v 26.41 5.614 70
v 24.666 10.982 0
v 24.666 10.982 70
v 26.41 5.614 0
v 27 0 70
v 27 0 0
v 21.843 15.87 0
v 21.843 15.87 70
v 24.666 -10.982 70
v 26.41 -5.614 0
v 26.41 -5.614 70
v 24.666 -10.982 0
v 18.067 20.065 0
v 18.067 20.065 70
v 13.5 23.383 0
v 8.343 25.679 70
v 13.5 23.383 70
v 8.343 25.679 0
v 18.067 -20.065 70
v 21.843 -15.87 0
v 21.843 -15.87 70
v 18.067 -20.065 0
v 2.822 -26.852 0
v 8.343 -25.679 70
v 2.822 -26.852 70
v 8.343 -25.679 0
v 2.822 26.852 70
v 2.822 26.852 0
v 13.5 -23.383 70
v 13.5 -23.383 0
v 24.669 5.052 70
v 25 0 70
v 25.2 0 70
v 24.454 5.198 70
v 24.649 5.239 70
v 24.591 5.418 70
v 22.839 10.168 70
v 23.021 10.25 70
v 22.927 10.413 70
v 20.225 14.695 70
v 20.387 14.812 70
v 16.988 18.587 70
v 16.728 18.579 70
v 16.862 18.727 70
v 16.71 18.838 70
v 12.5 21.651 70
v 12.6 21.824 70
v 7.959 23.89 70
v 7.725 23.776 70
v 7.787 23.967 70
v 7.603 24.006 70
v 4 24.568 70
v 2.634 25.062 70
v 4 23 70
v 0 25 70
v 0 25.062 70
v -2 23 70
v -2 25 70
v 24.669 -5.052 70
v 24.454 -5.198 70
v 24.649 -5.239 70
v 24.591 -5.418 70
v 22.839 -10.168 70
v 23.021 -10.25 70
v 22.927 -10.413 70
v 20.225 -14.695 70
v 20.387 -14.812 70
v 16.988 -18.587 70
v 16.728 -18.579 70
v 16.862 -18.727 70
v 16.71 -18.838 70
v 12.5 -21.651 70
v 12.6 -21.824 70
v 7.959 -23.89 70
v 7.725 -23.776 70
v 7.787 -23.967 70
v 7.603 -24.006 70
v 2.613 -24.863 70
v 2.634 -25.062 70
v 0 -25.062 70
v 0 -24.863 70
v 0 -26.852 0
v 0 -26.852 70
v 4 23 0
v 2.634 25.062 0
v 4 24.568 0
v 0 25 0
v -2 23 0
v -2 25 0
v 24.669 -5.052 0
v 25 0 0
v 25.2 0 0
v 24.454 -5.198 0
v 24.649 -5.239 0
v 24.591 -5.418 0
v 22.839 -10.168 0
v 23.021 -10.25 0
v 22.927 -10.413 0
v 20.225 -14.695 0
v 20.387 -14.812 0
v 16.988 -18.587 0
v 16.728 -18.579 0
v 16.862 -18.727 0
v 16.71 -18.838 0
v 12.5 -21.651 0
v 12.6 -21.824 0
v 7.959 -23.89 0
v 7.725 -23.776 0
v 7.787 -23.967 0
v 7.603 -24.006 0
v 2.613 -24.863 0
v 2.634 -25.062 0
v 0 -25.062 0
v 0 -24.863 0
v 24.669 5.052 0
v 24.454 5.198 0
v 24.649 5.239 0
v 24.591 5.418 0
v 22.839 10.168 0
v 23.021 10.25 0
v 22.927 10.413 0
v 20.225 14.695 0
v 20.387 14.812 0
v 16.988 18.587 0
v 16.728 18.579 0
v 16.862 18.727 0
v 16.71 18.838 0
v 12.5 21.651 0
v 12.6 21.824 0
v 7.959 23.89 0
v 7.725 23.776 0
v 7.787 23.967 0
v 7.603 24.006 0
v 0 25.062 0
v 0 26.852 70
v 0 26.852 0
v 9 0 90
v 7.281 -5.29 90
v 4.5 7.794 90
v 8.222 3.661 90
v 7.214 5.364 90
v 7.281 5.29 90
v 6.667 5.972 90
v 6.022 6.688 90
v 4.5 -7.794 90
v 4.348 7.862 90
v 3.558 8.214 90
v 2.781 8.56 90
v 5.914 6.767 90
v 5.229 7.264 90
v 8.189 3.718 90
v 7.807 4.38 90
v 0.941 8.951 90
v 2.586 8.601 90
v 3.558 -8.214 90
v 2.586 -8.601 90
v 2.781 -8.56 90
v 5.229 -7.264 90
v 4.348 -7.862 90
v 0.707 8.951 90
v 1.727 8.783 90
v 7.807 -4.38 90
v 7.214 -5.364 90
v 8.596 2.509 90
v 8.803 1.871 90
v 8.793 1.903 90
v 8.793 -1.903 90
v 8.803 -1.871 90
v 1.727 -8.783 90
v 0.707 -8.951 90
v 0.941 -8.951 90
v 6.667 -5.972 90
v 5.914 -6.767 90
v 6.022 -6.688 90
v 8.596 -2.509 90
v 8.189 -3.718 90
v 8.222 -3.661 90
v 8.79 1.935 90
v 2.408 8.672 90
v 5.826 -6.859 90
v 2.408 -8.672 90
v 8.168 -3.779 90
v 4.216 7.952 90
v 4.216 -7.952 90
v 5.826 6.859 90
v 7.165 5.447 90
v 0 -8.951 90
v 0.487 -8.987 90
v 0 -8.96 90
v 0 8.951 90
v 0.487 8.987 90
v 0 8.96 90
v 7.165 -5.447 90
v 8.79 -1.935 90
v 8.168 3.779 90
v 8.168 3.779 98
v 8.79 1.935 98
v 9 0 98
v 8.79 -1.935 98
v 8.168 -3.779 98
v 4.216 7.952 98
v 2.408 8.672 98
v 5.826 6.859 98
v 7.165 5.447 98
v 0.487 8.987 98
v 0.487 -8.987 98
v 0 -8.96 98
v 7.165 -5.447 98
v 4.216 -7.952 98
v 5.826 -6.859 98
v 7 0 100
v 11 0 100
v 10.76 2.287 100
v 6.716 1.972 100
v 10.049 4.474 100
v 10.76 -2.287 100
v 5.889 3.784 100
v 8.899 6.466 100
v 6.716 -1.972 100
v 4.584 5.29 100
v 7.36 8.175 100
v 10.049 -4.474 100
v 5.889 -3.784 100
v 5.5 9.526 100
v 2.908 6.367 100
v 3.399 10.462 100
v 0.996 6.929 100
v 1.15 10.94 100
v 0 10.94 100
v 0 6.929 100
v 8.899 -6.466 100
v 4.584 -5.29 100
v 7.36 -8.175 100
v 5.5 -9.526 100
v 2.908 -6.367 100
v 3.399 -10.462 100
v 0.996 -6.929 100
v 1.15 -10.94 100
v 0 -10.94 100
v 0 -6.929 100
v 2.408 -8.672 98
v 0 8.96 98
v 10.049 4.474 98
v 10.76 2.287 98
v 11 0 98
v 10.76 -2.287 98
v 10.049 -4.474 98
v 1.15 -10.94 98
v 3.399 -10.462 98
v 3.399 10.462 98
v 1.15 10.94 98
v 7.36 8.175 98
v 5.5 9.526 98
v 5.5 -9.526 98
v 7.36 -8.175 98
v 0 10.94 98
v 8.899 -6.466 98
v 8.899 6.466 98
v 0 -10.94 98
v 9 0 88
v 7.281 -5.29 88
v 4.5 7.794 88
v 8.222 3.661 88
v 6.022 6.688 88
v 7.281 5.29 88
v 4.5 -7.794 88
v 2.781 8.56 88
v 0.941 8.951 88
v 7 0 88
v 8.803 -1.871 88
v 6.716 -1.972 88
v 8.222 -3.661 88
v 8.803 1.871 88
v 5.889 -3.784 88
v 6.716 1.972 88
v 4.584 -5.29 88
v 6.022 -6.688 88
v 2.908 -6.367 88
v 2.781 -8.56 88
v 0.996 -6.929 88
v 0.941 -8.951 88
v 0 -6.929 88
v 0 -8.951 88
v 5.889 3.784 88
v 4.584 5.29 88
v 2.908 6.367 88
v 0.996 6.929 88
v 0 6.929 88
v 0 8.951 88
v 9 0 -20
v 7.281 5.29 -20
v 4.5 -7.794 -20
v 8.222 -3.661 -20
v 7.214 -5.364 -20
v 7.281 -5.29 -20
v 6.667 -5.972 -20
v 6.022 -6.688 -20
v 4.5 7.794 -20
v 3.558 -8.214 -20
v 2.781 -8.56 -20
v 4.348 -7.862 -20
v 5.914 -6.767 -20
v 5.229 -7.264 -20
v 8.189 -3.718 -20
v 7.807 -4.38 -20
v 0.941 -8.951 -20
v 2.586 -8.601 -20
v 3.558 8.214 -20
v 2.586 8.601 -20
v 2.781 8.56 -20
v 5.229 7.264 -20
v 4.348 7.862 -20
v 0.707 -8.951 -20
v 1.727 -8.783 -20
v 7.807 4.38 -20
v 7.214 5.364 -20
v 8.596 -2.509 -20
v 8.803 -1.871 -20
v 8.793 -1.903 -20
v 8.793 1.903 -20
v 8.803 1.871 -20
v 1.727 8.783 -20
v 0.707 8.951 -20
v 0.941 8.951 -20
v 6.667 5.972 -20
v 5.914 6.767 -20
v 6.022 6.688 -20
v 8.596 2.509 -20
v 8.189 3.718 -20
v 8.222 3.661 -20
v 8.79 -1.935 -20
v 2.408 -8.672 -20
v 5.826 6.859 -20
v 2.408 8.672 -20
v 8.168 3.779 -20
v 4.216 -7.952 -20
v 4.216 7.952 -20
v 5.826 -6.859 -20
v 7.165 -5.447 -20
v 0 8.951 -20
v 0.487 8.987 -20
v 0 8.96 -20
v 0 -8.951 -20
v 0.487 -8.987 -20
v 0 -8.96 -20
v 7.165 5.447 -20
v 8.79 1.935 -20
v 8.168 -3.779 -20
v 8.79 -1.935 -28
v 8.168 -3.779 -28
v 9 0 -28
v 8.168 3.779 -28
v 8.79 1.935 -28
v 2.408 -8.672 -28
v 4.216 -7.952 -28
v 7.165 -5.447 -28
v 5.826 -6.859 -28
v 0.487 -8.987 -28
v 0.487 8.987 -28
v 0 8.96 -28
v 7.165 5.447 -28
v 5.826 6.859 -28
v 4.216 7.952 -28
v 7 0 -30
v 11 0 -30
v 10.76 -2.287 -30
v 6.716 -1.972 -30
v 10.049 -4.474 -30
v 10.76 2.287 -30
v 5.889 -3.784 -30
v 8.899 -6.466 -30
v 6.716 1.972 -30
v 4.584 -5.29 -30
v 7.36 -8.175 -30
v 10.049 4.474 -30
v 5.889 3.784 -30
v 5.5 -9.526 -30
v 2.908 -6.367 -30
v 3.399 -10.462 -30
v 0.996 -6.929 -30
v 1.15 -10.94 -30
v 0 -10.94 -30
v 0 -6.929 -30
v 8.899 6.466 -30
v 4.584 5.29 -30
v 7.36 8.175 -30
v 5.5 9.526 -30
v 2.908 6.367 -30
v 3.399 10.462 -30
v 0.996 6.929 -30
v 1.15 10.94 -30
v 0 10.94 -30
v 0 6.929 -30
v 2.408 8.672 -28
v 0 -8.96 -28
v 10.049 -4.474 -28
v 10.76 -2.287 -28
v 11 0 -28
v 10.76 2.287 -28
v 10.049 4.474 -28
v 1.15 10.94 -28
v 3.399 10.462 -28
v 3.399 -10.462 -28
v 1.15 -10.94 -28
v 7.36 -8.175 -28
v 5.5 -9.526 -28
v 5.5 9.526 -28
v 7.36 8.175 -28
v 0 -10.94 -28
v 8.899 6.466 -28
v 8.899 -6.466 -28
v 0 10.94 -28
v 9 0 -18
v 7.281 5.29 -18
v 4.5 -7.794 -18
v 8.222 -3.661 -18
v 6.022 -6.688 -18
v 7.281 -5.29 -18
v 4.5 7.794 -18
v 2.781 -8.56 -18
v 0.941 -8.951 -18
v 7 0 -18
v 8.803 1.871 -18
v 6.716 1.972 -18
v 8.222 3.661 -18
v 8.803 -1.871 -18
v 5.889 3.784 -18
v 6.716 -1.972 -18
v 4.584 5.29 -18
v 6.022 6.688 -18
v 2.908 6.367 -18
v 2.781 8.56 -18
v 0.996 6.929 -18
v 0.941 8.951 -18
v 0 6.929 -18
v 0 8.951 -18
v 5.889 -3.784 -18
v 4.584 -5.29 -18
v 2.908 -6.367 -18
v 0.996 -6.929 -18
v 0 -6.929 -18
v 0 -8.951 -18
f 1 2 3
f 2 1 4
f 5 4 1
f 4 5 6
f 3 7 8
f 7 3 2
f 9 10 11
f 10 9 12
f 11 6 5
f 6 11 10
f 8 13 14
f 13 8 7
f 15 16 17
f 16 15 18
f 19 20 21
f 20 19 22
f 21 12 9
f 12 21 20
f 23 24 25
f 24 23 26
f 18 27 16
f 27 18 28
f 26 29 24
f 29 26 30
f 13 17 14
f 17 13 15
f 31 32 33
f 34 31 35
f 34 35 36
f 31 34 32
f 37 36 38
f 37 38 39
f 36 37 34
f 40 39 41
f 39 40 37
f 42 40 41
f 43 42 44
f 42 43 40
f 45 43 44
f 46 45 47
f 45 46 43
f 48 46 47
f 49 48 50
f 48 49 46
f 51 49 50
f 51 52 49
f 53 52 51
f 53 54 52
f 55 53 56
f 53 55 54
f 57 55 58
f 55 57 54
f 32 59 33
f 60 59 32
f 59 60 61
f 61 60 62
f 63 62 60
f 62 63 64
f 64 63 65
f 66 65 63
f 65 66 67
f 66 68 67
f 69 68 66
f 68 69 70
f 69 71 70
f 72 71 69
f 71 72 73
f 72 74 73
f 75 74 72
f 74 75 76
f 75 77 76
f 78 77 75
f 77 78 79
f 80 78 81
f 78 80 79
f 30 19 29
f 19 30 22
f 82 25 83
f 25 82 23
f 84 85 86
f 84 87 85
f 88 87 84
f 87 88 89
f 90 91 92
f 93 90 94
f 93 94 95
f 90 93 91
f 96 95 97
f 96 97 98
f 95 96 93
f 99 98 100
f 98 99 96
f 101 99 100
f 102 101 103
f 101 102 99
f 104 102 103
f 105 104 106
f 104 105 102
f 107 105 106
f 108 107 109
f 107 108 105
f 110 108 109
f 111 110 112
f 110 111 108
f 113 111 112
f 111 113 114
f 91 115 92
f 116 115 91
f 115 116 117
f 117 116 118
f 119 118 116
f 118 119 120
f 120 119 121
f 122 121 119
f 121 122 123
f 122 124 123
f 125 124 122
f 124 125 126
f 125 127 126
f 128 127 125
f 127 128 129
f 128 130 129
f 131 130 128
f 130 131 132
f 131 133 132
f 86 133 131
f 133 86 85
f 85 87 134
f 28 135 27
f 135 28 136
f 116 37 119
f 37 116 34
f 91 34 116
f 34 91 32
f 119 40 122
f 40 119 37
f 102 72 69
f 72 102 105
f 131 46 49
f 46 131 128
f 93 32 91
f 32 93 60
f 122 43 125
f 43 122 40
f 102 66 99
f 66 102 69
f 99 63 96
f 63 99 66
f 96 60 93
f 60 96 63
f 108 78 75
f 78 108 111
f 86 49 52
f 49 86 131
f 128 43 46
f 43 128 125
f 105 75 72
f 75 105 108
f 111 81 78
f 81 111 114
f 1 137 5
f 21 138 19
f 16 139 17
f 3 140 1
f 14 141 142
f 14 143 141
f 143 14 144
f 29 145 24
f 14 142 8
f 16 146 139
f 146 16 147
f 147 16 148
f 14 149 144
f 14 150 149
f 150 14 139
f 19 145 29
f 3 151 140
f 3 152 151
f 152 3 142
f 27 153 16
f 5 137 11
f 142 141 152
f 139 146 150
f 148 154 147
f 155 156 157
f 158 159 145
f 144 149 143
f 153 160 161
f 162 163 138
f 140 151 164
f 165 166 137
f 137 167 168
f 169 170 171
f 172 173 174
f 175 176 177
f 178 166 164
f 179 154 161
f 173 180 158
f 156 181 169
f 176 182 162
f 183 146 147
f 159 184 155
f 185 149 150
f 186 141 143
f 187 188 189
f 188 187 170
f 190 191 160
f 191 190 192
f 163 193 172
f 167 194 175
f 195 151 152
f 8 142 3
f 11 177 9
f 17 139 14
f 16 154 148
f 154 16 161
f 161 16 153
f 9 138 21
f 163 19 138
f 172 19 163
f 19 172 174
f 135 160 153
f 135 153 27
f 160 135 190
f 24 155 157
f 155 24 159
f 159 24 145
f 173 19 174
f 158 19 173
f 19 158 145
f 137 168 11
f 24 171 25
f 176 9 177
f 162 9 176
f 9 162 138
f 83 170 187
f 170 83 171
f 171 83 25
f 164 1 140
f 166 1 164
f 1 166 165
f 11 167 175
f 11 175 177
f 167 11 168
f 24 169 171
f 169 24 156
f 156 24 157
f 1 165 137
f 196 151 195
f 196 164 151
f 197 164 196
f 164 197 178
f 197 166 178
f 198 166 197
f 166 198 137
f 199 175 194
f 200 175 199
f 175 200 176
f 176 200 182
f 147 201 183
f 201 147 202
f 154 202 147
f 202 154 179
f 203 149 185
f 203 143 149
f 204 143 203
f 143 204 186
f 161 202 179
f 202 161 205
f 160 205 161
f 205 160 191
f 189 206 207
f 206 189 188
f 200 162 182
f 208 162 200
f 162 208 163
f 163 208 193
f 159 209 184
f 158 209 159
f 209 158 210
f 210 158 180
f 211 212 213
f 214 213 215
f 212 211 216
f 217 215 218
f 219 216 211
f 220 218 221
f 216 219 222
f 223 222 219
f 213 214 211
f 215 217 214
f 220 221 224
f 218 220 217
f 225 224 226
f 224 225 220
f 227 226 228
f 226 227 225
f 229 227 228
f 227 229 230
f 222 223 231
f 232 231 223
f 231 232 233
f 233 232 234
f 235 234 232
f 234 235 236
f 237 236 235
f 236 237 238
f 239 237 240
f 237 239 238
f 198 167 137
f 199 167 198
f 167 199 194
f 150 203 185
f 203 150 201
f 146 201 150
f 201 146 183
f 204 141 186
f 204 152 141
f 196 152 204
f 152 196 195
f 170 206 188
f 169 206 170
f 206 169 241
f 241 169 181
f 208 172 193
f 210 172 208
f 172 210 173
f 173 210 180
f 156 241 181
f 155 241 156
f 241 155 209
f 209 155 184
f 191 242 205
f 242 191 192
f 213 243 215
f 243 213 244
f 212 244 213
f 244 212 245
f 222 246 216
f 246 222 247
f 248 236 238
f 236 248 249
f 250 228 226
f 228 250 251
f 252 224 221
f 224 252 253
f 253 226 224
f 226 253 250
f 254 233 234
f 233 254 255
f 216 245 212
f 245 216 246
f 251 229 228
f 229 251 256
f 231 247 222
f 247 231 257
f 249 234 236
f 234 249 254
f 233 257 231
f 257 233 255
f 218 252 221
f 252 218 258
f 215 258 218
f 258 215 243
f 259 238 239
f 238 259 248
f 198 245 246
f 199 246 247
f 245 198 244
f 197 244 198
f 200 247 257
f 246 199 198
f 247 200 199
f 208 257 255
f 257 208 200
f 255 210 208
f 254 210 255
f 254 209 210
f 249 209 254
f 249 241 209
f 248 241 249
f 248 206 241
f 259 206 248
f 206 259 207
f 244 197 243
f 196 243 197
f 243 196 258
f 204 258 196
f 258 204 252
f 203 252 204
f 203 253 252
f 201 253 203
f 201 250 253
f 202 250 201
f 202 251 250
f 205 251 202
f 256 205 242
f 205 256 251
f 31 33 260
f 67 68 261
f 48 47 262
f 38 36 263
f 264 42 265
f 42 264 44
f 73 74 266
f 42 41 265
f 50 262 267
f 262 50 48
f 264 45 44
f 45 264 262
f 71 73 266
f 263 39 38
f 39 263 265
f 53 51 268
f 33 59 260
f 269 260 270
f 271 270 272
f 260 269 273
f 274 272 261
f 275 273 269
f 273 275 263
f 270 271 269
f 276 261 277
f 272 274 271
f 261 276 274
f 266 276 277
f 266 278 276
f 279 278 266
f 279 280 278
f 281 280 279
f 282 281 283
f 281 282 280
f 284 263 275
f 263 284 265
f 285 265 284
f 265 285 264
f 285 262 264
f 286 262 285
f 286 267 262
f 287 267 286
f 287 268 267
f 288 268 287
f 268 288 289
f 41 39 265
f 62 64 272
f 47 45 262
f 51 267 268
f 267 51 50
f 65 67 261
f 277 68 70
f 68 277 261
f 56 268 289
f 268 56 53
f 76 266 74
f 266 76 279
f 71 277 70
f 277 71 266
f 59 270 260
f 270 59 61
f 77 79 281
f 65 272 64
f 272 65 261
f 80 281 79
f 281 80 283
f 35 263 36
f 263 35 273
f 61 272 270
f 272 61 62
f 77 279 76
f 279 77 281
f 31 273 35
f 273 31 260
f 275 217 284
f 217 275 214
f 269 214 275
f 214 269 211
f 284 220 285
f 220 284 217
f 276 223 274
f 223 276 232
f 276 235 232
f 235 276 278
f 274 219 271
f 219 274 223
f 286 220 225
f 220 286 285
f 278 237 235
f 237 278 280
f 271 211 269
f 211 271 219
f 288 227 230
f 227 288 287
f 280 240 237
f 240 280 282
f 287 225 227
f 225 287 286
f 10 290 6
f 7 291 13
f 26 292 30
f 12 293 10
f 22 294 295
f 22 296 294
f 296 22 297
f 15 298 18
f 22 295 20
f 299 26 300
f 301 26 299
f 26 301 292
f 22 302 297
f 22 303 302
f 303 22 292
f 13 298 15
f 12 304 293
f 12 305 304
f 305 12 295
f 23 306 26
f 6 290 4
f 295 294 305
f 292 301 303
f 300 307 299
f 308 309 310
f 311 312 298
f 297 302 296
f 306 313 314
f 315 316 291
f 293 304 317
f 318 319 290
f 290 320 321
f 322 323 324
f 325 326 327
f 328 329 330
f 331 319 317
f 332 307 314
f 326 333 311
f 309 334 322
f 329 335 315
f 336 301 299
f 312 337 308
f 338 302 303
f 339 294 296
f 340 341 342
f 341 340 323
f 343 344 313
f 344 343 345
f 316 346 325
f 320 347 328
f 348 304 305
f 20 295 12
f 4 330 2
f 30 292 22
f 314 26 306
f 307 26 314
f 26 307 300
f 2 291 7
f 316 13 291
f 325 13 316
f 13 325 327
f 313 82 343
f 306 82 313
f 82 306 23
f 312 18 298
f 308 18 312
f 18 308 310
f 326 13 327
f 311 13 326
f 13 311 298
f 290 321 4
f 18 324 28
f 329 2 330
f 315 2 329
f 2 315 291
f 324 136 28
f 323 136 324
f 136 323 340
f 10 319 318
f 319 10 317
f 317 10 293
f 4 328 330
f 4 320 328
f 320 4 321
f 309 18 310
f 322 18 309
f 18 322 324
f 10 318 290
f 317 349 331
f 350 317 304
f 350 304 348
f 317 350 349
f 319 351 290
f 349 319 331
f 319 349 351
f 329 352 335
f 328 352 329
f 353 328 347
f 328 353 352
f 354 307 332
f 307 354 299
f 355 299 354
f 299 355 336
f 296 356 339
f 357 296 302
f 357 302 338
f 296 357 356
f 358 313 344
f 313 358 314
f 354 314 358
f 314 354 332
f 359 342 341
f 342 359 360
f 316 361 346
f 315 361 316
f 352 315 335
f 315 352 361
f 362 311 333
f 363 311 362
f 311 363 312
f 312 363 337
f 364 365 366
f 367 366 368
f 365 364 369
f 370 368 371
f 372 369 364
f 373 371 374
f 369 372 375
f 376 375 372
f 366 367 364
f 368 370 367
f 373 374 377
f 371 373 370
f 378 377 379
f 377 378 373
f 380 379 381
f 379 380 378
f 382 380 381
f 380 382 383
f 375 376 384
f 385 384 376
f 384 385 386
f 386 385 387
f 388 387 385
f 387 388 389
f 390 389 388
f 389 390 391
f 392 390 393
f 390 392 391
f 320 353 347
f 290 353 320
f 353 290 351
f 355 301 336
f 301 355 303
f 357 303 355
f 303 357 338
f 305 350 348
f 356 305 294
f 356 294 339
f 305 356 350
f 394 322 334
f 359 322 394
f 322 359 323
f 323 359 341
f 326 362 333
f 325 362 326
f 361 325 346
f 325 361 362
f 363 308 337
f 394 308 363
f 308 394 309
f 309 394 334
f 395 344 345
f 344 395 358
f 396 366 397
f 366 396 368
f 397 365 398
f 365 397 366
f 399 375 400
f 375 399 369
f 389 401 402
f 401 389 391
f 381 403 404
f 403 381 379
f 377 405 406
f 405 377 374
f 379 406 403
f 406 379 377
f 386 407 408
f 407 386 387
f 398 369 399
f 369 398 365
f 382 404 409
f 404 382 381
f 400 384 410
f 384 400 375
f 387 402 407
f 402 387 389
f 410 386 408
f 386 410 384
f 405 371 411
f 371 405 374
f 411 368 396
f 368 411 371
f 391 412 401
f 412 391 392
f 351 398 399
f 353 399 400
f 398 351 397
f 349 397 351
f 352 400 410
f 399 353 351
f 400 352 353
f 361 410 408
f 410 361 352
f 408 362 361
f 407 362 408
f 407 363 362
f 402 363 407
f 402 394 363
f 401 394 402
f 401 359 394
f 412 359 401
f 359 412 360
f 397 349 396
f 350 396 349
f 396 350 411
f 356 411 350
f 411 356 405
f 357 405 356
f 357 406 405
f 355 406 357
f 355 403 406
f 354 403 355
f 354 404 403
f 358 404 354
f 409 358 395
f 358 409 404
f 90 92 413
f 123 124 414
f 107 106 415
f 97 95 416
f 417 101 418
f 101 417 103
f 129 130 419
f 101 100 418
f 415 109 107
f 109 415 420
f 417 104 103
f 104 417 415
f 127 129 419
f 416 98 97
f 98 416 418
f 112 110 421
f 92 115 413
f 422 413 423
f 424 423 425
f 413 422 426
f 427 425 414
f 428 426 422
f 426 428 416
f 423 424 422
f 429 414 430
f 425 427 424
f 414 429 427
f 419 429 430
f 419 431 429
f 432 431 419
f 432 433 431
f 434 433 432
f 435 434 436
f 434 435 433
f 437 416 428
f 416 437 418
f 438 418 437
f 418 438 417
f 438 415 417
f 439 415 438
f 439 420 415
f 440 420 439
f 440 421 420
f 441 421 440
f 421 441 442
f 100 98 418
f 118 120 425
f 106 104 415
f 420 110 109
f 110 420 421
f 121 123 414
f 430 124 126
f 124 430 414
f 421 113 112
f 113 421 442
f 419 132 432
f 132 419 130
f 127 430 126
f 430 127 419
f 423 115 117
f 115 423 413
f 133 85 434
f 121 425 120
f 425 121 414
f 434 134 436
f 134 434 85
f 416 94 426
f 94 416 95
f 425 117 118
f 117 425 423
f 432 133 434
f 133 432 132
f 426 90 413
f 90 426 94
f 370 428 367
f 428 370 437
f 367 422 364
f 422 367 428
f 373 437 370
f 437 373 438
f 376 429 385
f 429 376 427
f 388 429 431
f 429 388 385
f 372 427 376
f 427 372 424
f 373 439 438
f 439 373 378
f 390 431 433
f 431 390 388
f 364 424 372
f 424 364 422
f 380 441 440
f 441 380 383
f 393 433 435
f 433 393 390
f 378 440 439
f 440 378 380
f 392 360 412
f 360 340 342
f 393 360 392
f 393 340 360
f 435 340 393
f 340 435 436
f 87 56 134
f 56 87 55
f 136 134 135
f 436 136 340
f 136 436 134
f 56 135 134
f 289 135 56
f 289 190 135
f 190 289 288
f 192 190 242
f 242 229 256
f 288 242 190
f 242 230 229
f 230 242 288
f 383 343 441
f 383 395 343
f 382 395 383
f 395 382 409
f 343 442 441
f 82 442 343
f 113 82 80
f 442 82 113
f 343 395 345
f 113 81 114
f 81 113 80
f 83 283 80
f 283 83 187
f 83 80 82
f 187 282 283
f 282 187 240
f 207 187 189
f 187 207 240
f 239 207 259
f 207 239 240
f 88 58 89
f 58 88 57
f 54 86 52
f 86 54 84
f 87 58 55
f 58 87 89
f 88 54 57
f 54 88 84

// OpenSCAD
// How long should the body be?
body_length = 70; // [1:200]

// How big around should the body be?
body_radius=27; // [1:100]

// How thick should the entire Cord Guard be?
thickness=2;   // [1:10]

// How long should the cones between the body and the tip be?
end_length=20;  // [1:80]

//How long should the ends protrude?
tip_length=10;  // [1:40]

// How big around should the end parts be? 
tip_radius=9;   // [1:40]


difference (){
union () {
   difference(){
     cylinder (h=body_length, r=body_radius);
     cylinder (h=body_length+10, r=body_radius-thickness);
       
   }
   
   rotate ([0,0,0]) translate ([0,0,body_length])
   difference () {
     union (){
       cylinder (h=end_length, r1=body_radius, r2=tip_radius);
       translate ([0,0,end_length]) cylinder (h=tip_length, r=tip_radius);
       translate ([0,0,end_length+tip_length-thickness])cylinder (h=thickness, r=tip_radius+thickness);
     }
     union () {
       translate ([0,0,-2]) cylinder (h=end_length, r1=body_radius, r2=tip_radius);
       cylinder (h=end_length+tip_length, r=tip_radius-thickness);
     }
   }
   
   rotate ([180,0,0]) translate ([0,0,0])
   difference () {
     union (){
       cylinder (h=end_length, r1=body_radius, r2=tip_radius);
       translate ([0,0,end_length]) cylinder (h=tip_length, r=tip_radius);
       translate ([0,0,end_length+tip_length-thickness])cylinder (h=thickness, r=tip_radius+thickness);
     }
     union () {
       translate ([0,0,-2]) cylinder (h=end_length, r1=body_radius, r2=9);
       cylinder (h=end_length+tip_length, r=tip_radius-thickness);
     }
   }
   
   }
rotate ([0,-90,0]) translate ([-end_length-tip_length-1, -body_radius,0 ])
cube ([end_length*2+tip_length*2+ body_length+2, 
   body_radius*2, body_radius]);
   
   }
   
   rotate ([0,-90,0]) 
   translate ([0, body_radius-thickness*2,-thickness*2])
   cube ([body_length, thickness, thickness*3]);
